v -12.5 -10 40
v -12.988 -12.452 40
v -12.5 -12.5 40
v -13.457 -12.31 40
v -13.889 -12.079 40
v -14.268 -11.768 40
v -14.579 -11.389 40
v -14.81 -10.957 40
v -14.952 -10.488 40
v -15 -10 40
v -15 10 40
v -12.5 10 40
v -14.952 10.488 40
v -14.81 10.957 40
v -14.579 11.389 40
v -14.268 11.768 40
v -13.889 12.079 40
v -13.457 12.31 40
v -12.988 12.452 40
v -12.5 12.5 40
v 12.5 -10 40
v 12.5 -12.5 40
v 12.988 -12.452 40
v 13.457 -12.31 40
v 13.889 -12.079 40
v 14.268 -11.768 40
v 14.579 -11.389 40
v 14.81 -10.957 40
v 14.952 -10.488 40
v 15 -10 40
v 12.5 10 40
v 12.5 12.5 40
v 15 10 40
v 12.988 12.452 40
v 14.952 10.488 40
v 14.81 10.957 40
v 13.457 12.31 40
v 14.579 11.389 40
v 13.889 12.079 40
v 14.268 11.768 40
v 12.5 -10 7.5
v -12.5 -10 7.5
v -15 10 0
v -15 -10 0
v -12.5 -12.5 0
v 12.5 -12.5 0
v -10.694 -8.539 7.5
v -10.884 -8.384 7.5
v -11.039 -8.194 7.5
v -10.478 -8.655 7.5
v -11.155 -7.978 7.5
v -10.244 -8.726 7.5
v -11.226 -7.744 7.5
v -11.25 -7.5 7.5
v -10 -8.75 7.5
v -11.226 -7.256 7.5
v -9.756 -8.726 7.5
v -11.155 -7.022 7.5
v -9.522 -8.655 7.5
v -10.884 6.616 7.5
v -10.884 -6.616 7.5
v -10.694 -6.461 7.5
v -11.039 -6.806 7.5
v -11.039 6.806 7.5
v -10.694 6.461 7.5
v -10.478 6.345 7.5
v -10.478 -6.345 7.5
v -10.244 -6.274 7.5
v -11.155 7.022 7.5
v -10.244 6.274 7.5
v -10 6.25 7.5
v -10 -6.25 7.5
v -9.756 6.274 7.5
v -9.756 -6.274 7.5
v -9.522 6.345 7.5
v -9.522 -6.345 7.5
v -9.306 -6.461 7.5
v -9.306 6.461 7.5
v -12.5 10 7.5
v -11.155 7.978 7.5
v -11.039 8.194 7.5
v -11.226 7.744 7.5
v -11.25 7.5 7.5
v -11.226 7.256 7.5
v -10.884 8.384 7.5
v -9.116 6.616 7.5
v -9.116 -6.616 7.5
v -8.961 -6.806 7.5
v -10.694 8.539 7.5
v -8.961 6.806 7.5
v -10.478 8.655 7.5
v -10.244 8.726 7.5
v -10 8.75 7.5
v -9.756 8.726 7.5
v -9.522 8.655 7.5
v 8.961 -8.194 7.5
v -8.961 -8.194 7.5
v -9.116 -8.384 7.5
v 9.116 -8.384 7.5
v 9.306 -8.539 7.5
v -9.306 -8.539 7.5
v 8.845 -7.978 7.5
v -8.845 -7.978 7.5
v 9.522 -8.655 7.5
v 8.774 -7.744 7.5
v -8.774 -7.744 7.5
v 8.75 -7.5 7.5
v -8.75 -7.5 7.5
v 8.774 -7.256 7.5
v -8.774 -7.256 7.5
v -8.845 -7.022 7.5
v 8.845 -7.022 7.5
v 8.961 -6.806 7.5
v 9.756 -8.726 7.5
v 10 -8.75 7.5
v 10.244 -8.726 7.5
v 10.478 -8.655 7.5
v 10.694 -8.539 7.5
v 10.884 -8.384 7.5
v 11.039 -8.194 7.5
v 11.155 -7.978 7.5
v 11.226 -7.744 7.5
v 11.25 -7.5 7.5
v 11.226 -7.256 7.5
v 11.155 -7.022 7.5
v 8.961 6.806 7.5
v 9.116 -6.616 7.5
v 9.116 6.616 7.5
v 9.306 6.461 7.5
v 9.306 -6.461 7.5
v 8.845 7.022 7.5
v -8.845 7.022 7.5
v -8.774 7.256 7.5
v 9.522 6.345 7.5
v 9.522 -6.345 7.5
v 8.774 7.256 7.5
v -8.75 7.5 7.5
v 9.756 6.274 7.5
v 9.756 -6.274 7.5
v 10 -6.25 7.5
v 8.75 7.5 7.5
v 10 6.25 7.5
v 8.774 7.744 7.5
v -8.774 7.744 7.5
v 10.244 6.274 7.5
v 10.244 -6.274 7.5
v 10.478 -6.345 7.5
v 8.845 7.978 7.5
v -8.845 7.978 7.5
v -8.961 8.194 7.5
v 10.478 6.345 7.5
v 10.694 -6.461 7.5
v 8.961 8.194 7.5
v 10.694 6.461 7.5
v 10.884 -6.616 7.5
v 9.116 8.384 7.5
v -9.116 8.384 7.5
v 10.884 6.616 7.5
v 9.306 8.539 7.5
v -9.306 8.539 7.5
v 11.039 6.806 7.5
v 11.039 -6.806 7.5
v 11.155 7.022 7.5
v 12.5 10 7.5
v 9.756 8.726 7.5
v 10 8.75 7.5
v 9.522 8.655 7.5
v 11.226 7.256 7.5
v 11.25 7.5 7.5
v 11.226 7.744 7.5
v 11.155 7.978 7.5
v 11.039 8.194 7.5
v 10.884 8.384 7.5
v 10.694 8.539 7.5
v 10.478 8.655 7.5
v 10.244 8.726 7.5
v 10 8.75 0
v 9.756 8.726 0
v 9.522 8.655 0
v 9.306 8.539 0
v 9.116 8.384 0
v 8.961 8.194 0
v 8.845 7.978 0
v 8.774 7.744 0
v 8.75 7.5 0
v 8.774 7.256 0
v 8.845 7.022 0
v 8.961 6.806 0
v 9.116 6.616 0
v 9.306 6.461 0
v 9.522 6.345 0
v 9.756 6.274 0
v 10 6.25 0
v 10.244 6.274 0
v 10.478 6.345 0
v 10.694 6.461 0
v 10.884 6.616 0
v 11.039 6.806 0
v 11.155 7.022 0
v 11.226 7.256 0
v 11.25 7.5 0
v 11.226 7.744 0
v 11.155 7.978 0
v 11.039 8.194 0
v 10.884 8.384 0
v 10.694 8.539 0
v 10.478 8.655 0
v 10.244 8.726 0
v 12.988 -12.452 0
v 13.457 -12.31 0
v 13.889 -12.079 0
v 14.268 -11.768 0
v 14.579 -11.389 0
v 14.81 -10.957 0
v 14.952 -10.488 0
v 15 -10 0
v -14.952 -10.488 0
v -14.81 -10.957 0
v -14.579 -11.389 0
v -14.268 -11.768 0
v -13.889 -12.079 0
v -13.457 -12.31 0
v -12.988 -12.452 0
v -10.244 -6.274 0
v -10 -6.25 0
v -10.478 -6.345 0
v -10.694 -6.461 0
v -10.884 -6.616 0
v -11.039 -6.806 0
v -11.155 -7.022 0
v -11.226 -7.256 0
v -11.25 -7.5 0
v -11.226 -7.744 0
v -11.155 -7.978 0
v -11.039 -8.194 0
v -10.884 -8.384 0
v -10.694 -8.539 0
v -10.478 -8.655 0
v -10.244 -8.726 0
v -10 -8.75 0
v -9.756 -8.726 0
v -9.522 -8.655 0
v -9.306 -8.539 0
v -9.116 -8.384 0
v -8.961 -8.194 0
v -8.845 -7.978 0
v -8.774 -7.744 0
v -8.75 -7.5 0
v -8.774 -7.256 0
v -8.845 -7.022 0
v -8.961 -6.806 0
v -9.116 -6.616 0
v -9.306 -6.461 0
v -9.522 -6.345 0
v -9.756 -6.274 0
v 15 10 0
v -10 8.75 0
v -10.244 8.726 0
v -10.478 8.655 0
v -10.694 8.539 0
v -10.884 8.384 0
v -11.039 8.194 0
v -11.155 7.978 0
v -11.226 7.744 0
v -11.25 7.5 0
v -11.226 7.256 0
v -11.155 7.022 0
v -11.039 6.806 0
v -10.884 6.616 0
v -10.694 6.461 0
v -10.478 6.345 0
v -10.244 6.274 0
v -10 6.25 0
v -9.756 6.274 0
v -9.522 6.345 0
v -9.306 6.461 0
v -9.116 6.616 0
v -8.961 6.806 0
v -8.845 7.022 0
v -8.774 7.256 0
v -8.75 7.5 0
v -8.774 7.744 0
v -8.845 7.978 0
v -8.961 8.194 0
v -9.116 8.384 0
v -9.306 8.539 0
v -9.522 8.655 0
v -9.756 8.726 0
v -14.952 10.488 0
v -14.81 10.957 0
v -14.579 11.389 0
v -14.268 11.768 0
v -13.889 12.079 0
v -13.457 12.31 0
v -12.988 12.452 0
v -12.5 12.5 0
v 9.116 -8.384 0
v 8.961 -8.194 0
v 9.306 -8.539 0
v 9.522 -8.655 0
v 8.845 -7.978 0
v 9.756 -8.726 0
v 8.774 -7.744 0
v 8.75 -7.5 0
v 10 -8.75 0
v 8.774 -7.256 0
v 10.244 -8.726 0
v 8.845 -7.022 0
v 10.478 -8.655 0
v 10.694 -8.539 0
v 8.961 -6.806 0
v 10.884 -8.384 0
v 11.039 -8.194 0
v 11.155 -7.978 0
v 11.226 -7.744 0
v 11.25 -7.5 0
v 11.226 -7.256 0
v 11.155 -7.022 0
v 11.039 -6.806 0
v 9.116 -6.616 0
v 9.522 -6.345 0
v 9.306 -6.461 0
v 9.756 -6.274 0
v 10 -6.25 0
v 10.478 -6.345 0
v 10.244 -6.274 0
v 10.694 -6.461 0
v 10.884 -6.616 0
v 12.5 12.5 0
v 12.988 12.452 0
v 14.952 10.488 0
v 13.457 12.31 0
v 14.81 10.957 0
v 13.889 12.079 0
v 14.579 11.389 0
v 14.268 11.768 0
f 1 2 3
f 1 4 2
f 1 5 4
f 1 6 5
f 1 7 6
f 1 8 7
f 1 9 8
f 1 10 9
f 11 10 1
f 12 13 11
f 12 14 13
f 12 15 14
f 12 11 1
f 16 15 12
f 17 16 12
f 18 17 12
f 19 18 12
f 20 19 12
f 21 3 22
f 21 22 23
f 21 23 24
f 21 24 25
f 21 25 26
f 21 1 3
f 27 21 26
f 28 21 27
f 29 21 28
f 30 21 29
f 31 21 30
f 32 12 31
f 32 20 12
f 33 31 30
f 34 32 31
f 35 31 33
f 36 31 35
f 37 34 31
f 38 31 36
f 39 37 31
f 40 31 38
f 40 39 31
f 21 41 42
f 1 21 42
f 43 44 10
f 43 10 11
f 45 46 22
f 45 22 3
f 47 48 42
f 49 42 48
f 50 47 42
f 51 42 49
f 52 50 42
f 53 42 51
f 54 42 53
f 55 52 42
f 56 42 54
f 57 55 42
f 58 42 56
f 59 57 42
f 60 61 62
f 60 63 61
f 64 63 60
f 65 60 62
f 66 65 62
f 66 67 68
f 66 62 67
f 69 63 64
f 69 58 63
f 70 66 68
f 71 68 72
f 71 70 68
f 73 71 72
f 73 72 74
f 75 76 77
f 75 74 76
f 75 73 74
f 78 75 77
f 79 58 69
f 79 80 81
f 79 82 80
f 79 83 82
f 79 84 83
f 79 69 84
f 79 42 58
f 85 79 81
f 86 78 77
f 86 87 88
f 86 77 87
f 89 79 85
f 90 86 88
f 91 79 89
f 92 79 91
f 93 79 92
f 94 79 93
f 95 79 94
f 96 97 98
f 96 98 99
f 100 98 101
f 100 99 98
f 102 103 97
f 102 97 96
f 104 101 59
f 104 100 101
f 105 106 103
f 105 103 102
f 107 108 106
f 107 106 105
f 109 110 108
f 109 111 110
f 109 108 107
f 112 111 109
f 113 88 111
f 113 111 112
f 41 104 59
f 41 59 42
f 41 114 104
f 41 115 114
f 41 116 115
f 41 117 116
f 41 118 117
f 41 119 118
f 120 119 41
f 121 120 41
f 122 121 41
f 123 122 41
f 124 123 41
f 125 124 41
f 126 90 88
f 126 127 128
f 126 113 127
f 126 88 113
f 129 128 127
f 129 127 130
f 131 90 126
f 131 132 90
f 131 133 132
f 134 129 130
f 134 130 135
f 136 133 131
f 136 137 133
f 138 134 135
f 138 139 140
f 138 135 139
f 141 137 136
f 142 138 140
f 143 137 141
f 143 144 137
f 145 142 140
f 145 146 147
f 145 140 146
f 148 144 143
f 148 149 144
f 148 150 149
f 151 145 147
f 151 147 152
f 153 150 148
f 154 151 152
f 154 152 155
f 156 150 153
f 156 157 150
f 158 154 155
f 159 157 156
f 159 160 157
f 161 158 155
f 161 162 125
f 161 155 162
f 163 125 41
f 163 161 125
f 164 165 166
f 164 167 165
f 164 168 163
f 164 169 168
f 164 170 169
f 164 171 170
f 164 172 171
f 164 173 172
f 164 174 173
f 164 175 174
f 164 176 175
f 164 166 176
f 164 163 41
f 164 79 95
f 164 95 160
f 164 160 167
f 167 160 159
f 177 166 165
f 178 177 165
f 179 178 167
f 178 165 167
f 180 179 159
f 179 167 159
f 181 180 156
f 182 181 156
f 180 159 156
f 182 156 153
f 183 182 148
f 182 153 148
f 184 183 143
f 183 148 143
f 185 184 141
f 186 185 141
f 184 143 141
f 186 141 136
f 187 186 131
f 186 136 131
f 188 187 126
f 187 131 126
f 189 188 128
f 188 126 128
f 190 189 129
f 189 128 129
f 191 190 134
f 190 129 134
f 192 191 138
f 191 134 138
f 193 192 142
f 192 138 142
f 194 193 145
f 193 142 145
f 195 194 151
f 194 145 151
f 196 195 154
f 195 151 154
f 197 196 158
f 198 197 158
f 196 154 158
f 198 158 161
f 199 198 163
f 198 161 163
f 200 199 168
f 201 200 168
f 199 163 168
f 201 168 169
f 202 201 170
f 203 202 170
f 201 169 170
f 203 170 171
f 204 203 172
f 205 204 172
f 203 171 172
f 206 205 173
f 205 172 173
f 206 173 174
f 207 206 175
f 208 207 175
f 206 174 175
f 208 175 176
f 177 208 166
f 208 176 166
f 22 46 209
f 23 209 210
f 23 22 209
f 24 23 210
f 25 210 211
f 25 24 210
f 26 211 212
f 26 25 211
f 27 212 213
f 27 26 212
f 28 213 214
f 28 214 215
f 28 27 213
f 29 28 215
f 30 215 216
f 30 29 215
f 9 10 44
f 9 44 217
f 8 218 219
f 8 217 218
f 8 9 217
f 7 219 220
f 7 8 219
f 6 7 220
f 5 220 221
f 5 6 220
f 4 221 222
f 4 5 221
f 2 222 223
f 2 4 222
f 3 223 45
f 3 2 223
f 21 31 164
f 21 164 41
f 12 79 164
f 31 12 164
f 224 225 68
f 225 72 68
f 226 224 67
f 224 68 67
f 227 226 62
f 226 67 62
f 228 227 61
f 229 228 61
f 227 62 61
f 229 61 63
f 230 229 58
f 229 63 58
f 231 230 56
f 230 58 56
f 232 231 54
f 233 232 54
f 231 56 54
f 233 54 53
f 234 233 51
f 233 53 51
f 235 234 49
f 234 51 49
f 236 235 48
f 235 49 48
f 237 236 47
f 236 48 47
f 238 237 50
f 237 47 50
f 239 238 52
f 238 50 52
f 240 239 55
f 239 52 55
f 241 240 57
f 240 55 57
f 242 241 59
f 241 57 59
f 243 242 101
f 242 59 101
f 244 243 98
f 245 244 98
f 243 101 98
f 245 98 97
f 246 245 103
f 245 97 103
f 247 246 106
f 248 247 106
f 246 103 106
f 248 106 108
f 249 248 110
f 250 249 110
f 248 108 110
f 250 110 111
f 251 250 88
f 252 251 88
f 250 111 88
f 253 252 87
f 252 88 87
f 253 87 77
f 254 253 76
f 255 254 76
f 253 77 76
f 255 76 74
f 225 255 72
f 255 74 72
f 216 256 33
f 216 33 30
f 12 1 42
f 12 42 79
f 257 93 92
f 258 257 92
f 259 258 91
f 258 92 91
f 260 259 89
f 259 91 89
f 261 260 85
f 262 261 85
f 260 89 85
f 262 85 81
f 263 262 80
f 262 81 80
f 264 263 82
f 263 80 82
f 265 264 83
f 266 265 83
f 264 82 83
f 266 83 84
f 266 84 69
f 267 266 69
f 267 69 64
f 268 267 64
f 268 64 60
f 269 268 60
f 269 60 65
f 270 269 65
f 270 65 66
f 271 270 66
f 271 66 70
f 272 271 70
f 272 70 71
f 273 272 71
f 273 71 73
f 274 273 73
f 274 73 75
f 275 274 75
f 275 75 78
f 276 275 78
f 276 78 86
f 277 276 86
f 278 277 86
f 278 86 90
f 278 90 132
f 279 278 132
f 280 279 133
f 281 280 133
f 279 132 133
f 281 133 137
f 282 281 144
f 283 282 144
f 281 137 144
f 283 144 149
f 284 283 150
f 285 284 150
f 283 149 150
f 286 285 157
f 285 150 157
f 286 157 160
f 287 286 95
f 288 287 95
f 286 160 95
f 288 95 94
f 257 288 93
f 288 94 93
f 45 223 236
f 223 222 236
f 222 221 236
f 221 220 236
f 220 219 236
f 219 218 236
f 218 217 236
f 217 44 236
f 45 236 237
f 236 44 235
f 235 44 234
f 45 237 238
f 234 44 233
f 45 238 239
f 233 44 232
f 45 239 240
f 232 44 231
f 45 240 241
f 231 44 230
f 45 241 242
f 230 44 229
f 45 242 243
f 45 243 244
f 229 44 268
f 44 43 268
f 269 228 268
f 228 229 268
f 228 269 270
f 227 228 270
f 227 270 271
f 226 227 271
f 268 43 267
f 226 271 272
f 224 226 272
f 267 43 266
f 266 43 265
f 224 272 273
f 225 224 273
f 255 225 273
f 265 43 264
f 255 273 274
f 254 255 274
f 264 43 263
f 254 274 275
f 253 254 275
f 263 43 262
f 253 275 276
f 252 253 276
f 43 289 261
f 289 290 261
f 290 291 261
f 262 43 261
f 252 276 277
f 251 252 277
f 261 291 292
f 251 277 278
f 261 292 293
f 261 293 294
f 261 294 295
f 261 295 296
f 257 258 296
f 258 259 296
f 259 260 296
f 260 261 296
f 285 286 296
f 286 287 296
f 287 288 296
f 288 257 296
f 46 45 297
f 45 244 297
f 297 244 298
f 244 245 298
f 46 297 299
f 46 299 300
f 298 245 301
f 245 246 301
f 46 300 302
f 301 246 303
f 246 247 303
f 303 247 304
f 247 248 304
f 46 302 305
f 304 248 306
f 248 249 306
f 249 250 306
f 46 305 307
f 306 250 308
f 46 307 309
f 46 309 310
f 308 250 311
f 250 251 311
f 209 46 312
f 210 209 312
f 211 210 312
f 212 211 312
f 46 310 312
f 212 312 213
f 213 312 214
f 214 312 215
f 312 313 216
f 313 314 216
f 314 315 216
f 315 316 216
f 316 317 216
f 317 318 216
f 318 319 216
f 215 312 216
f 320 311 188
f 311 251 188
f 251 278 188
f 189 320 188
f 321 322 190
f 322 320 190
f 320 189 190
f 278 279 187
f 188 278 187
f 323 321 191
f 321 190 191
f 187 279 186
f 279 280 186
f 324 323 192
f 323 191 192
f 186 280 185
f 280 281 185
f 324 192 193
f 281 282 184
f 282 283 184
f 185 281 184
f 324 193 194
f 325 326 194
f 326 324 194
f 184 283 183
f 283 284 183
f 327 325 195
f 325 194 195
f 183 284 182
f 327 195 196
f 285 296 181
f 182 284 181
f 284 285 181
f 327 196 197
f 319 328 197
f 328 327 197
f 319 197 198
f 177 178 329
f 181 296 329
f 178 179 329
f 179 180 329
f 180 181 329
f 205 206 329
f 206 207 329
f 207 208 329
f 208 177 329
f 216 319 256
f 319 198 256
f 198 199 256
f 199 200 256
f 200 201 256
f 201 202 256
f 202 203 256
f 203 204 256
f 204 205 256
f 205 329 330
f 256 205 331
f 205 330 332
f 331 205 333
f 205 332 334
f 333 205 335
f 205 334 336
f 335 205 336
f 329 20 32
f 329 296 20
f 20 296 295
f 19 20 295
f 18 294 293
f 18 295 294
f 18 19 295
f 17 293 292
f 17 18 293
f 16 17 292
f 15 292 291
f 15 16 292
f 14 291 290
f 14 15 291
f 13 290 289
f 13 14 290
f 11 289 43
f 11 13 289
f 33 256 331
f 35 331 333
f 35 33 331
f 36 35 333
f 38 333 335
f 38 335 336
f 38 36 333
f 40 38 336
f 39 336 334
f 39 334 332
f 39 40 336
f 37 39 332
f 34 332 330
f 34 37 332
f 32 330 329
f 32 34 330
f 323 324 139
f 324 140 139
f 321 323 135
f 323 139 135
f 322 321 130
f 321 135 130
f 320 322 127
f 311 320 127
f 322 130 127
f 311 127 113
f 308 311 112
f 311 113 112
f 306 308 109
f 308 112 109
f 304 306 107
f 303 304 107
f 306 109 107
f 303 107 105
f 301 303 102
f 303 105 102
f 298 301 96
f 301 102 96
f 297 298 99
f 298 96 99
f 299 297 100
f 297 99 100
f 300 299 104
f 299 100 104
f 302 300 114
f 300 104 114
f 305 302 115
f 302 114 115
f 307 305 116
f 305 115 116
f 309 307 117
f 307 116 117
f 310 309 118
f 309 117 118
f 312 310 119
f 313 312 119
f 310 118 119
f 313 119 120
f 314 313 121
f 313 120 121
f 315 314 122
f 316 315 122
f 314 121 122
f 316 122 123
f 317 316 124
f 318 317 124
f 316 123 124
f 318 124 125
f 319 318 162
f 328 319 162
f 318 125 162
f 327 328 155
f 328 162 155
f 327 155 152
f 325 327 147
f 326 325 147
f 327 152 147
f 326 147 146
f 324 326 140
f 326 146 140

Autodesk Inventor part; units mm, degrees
ref_plane "YZ Plane" through (0, 0, 0) normal (1, 0, 0) x (0, 1, 0)
ref_plane "XZ Plane" through (0, 0, 0) normal (0, 1, 0) x (-1, 0, 0)
ref_plane "XY Plane" through (0, 0, 0) normal (0, 0, 1) x (1, 0, 0)
sketch "Sketch1" plane through (0, 0, 0) normal (0, 0, 1) x (1, 0, 0)
  line L0 (-10, -10) -> (10, -10) construction
  line L1 (10, -10) -> (10, 10) construction
  line L2 (10, 10) -> (-10, 10) construction
  line L3 (-10, 10) -> (-10, -10) construction
  line L4 (-10, -10) -> (10, 10) construction
  line L5 (10, -10) -> (-10, 10) construction
  line L6 (10, -7.5) -> (-10, -7.5) construction
  line L7 (-10, -7.5) -> (-10, 7.5) construction
  line L8 (-10, 7.5) -> (10, 7.5) construction
  line L9 (10, 7.5) -> (10, -7.5) construction
  line L10 (10, -7.5) -> (-10, 7.5) construction
  line L11 (-10, -7.5) -> (10, 7.5) construction
  line L12 (12.5, -10) -> (-12.5, -10)
  line L13 (-12.5, -10) -> (-12.5, 10)
  line L14 (-12.5, 10) -> (12.5, 10)
  line L15 (12.5, 10) -> (12.5, -10)
  line L16 (12.5, -10) -> (-12.5, 10) construction
  line L17 (-12.5, -10) -> (12.5, 10) construction
  line L18 (15, -12.5) -> (-15, -12.5)
  line L19 (-15, -12.5) -> (-15, 12.5)
  line L20 (-15, 12.5) -> (15, 12.5)
  line L21 (15, 12.5) -> (15, -12.5)
  line L22 (15, -12.5) -> (-15, 12.5) construction
  line L23 (-15, -12.5) -> (15, 12.5) construction
  point P0 (0, 0)
  dimension "d0" = 20
  dimension "d1" = 20
  dimension "d2" = 20
  dimension "d3" = 15
  dimension "d4" = 25
  dimension "d5" = 20
  dimension "d6" = 30
  dimension "d7" = 25
extrude "Extrusion1" add sketch "Sketch1" along normal blind 7.5 contours L12 L13 L14 L15
extrude "Extrusion2" add sketch "Sketch1" along normal blind 40
hole "Hole1" at (-10, 7.5, 0) at (10, 7.5, 0) at (10, -7.5, 0) at (-10, -7.5, 0) direction (0, 0, 1) diameter 2.5 end through all both
fillet "Fillet1" radius 2.5 4 edges at (15, 12.5, 20) (-15, 12.5, 20) (15, -12.5, 20) (-15, -12.5, 20)
properties part number "slotcar_adapter"
